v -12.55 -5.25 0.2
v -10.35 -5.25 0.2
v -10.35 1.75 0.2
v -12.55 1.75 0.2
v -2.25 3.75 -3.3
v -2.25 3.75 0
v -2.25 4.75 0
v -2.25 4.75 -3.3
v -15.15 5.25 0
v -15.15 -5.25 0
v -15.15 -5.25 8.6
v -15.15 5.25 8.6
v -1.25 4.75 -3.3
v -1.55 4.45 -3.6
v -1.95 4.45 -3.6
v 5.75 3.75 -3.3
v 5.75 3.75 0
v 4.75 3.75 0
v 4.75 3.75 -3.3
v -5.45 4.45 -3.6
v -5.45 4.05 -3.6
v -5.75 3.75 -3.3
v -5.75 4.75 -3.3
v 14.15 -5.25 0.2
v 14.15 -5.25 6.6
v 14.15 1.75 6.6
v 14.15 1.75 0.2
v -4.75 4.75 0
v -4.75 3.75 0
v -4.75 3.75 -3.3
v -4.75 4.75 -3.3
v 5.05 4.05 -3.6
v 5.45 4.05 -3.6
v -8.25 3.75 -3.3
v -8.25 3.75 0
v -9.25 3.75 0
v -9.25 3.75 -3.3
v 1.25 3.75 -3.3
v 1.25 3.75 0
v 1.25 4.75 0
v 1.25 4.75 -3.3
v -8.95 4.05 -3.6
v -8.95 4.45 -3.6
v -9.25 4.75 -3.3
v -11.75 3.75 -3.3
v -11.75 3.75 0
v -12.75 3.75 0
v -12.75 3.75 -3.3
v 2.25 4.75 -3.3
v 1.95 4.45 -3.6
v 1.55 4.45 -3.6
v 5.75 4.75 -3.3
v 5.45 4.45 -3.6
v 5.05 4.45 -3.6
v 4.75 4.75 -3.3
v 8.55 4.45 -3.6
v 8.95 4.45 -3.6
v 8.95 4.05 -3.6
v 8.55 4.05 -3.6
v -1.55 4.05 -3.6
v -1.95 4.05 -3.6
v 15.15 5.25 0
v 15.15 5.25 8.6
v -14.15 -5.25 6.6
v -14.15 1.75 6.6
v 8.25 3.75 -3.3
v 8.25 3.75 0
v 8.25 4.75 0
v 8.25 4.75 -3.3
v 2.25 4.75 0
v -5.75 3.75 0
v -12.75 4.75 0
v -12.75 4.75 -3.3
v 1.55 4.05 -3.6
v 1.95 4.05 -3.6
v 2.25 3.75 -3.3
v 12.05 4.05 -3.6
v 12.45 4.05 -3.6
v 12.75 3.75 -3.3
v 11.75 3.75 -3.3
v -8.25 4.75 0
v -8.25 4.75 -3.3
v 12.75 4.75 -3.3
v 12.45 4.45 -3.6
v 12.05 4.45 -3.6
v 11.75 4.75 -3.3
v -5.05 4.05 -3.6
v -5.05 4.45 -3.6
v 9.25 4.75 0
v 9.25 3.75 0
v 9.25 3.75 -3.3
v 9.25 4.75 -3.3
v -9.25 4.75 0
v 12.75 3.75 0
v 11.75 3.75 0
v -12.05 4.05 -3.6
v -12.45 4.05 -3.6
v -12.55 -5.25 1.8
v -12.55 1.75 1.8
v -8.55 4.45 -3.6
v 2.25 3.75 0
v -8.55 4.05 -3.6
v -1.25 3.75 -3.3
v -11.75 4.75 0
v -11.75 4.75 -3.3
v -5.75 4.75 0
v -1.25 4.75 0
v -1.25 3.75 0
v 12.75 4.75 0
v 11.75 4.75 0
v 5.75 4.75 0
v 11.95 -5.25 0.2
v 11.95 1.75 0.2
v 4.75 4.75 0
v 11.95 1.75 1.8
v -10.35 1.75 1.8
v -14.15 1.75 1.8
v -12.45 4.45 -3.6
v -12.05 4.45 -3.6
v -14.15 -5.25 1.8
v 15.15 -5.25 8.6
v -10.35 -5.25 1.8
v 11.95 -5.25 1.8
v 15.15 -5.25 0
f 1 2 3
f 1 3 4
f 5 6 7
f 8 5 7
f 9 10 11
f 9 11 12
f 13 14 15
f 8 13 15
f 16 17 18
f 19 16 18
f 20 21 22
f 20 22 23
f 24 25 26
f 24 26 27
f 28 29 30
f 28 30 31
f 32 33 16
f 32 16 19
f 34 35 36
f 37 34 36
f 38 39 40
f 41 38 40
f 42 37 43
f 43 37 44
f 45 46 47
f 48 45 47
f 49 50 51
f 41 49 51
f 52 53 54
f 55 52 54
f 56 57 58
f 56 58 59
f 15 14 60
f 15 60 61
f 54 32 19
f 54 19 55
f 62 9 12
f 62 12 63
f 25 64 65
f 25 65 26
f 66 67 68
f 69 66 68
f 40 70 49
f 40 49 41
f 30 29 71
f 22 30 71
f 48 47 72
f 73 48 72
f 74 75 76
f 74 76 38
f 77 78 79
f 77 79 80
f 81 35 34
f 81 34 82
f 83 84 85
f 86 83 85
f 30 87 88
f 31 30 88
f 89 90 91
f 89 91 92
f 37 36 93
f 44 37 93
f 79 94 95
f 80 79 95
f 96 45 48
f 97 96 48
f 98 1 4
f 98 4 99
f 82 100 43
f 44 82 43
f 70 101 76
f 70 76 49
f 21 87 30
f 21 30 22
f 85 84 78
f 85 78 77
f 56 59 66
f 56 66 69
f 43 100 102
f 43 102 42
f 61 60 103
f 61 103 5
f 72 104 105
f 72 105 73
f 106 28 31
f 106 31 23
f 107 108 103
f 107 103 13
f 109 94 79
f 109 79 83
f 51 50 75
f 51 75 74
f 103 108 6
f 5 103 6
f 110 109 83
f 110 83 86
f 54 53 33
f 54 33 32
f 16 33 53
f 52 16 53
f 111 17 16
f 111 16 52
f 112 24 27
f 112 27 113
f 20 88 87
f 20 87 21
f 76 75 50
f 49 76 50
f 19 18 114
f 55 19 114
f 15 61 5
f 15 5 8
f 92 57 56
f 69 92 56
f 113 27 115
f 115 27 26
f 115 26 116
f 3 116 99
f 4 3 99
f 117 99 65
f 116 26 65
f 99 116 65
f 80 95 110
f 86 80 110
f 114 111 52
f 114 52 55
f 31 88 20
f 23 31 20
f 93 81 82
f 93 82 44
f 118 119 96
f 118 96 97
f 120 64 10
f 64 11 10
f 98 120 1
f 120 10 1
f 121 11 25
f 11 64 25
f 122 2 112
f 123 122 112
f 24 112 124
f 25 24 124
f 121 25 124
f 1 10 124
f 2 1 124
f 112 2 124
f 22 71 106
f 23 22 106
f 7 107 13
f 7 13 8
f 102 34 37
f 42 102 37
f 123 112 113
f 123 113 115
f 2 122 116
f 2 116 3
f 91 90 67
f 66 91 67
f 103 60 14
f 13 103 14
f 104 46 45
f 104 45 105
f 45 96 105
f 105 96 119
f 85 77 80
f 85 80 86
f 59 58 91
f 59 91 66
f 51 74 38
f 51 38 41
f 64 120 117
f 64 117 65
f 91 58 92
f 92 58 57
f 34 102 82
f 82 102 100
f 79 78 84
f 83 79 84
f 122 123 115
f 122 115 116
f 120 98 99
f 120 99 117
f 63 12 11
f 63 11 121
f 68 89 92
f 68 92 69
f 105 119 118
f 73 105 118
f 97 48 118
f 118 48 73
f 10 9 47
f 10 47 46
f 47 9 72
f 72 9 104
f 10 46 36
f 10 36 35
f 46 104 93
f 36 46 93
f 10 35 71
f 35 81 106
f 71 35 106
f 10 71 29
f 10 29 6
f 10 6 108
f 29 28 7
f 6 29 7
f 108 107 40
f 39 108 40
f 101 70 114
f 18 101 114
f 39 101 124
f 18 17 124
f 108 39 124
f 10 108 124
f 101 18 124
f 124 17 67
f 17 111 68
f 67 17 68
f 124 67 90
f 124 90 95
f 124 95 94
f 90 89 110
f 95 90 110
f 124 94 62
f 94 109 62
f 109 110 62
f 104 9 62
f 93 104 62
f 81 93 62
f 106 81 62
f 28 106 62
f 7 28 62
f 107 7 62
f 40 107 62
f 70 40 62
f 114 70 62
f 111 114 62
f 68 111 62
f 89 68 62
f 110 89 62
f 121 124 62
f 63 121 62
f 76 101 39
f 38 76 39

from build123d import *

# Parameters (mm, degrees)
SKETCH_1_W                         = 30.3
SKETCH_1_H                         = 10.5
EXTRUDE_1_DEPTH                    = 8.6
CUT_EXTRUDE_1_DEPTH                = 7
EXTRUDE_START                      = -5
SKETCH_3_W                         = 1
SKETCH_3_H                         = 1
EXTRUDE_2_DEPTH                    = 8.6
CHAMFER_1_SIZE                     = 0.3
PATTERN_LINEAR_1_COUNT             = 8
PATTERN_LINEAR_1_PITCH             = 3.5
CHAMFER_1_OF_PATTERN_LINEAR_1_SIZE = 0.3


with BuildPart() as part:
    # Эскиз1 → Бобышка-Вытянуть1 (new body)
    with BuildSketch(Plane.XY):
        Rectangle(SKETCH_1_W, SKETCH_1_H)
    extrude(amount=EXTRUDE_1_DEPTH)

    # Эскиз2 → Вырез-Вытянуть1 (cut)
    with BuildSketch(Plane.XZ.offset(5.25)):
        Polygon((-14.15, 6.6), (14.15, 6.6), (14.15, 0.2), (11.95, 0.2), (11.95, 1.8), (-10.35, 1.8), (-10.35, 0.2), (-12.55, 0.2), (-12.55, 1.8), (-14.15, 1.8), align=None)
    extrude(amount=-CUT_EXTRUDE_1_DEPTH, mode=Mode.SUBTRACT)

    # Эскиз3 → Бобышка-Вытянуть2 (add)
    with BuildSketch(Plane(origin=(0, 0, 0), x_dir=(-1, 0, 0), z_dir=(0, 0, -1)).offset(EXTRUDE_START)):
        with Locations((12.25, 4.25)):
            Rectangle(SKETCH_3_W, SKETCH_3_H)
    extrude_2 = extrude(amount=EXTRUDE_2_DEPTH)

    # Фаска1
    chamfer_1_edges = [part.edges().sort_by_distance(p)[0] for p in [
        (-11.75, 4.25, -3.6),
        (-12.25, 3.75, -3.6),
        (-12.75, 4.25, -3.6),
        (-12.25, 4.75, -3.6),
    ]]
    chamfer(chamfer_1_edges, length=CHAMFER_1_SIZE)

    # Линейный массив1: Бобышка-Вытянуть2 ×8
    with Locations(*[(i * PATTERN_LINEAR_1_PITCH, 0, 0) for i in range(1, PATTERN_LINEAR_1_COUNT)]):
        add(extrude_2)

    # Фаска1 of Линейный массив1
    chamfer_1_of_pattern_linear_1_edges = [part.edges().sort_by_distance(p)[0] for p in [
        (-8.25, 4.25, -3.6),
        (-8.75, 3.75, -3.6),
        (-9.25, 4.25, -3.6),
        (-8.75, 4.75, -3.6),
        (-4.75, 4.25, -3.6),
        (-5.25, 3.75, -3.6),
        (-5.75, 4.25, -3.6),
        (-5.25, 4.75, -3.6),
        (-1.25, 4.25, -3.6),
        (-1.75, 3.75, -3.6),
        (-2.25, 4.25, -3.6),
        (-1.75, 4.75, -3.6),
        (2.25, 4.25, -3.6),
        (1.75, 3.75, -3.6),
        (1.25, 4.25, -3.6),
        (1.75, 4.75, -3.6),
        (5.75, 4.25, -3.6),
        (5.25, 3.75, -3.6),
        (4.75, 4.25, -3.6),
        (5.25, 4.75, -3.6),
        (9.25, 4.25, -3.6),
        (8.75, 3.75, -3.6),
        (8.25, 4.25, -3.6),
        (8.75, 4.75, -3.6),
        (12.75, 4.25, -3.6),
        (12.25, 3.75, -3.6),
        (11.75, 4.25, -3.6),
        (12.25, 4.75, -3.6),
    ]]
    chamfer(chamfer_1_of_pattern_linear_1_edges, length=CHAMFER_1_OF_PATTERN_LINEAR_1_SIZE)


solid = part.part
